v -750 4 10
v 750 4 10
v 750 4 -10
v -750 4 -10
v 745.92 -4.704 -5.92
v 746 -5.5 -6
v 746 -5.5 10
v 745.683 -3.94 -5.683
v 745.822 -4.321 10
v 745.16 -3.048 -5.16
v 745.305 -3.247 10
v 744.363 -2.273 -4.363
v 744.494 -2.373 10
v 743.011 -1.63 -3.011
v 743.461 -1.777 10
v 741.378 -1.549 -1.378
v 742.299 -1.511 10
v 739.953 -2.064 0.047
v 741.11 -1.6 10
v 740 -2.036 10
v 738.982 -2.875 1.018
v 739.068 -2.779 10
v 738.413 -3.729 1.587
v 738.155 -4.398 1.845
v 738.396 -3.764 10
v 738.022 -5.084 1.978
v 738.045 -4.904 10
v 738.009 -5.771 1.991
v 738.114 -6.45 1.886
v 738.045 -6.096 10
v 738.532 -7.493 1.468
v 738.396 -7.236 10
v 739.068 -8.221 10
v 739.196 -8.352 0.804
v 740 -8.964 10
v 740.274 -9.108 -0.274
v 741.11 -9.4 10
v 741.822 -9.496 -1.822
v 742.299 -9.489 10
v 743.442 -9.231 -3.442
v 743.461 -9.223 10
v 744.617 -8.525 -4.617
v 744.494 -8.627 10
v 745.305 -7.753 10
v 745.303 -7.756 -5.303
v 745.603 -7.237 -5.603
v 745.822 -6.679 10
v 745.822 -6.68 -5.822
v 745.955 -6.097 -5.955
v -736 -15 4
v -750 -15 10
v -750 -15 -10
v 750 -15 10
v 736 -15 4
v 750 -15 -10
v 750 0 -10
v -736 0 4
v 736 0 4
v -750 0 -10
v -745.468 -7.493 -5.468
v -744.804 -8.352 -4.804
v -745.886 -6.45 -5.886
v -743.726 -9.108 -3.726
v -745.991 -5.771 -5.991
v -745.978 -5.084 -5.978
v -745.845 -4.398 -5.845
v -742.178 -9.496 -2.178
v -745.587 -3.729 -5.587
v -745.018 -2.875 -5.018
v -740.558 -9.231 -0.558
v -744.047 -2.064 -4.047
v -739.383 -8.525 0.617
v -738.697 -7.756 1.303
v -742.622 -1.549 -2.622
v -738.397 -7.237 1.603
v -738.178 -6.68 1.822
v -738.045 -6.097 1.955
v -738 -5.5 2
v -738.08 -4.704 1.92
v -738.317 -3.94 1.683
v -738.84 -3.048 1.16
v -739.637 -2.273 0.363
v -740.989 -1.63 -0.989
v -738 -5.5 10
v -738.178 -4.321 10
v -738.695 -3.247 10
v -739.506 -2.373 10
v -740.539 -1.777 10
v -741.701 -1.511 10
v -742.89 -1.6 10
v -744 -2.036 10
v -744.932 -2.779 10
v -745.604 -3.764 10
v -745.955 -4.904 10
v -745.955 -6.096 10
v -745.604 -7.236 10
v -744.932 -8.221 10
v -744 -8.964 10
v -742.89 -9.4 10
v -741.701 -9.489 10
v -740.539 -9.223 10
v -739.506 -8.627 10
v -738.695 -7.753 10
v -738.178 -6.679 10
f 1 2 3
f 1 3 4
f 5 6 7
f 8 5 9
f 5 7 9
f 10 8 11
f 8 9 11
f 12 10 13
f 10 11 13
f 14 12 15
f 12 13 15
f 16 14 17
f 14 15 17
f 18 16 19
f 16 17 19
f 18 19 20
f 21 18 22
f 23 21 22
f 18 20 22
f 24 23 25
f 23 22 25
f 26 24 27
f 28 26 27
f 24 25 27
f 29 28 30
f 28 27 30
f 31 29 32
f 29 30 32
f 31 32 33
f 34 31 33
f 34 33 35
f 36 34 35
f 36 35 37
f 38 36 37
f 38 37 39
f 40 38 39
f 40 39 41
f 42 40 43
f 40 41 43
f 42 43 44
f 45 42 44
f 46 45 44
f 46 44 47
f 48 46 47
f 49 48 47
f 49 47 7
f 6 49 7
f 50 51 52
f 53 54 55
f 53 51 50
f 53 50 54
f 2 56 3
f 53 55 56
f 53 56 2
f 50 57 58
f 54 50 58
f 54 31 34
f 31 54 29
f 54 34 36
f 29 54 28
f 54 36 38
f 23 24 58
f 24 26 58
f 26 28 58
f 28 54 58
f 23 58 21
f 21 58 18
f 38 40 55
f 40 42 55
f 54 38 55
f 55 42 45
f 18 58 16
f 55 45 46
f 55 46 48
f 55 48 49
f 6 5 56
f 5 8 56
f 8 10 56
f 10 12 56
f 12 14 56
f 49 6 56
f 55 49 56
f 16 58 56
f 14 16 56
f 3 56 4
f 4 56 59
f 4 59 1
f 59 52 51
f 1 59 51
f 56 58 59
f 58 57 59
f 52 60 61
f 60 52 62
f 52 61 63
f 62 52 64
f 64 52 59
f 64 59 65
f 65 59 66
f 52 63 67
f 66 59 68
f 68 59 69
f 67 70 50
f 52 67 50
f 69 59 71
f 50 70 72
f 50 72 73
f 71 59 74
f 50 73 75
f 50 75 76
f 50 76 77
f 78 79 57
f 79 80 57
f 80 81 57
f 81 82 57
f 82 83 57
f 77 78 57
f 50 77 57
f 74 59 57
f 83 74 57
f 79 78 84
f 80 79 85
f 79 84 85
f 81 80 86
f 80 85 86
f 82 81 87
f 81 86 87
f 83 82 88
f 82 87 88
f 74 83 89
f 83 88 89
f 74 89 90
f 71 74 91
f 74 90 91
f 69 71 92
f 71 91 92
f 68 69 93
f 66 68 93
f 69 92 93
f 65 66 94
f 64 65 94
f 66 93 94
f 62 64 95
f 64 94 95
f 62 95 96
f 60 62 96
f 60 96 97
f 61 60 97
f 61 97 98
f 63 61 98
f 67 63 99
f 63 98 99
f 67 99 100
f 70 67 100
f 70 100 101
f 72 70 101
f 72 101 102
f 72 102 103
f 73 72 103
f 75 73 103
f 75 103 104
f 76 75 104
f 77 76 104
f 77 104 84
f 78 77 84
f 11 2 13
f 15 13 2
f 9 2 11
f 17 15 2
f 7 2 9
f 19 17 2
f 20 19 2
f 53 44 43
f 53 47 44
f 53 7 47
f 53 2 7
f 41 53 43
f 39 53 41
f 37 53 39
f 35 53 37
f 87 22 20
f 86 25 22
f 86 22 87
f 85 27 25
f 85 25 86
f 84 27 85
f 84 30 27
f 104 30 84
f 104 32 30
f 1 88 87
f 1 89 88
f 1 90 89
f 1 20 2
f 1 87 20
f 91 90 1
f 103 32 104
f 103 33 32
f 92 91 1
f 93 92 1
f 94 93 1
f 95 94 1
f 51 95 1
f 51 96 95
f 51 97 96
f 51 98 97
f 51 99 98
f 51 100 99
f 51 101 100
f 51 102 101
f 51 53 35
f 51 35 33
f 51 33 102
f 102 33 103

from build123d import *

# Parameters (mm, degrees)
F0_W     = 1500
F0_H     = 20
F1_DEPTH = 15
F3_DEPTH = 25
F4_W     = 1500
F4_H     = 20
F5_DEPTH = 4
F6_R     = 4
F7_DEPTH = 20.001


with BuildPart() as f1:
    # F0 (on Front) → F1 (new body)
    with BuildSketch(Plane.XZ):
        Rectangle(F0_W, F0_H)
    extrude(amount=F1_DEPTH)

    # F2 (on face) → F3 (cut)
    with BuildSketch(Plane(origin=(0, 0, 0), x_dir=(-1, 0, 0), z_dir=(0, 1, 0))):
        Polygon((-736, 4), (-750, -10), (750, -10), (736, 4), align=None)
    extrude(amount=-F3_DEPTH, mode=Mode.SUBTRACT)

    # F4 (on face) → F5 (join)
    with BuildSketch(Plane(origin=(0, 0, 0), x_dir=(-1, 0, 0), z_dir=(0, 1, 0))):
        Rectangle(F4_W, F4_H)
    extrude(amount=F5_DEPTH)

    # F6 (on face) → F7 (cut, through all)
    with BuildSketch(Plane.XY.offset(10)):
        with Locations((-742, -5.5)):
            Circle(F6_R)
        with Locations((742, -5.5)):
            Circle(F6_R)
    extrude(amount=-F7_DEPTH, mode=Mode.SUBTRACT)


solid = f1.part
